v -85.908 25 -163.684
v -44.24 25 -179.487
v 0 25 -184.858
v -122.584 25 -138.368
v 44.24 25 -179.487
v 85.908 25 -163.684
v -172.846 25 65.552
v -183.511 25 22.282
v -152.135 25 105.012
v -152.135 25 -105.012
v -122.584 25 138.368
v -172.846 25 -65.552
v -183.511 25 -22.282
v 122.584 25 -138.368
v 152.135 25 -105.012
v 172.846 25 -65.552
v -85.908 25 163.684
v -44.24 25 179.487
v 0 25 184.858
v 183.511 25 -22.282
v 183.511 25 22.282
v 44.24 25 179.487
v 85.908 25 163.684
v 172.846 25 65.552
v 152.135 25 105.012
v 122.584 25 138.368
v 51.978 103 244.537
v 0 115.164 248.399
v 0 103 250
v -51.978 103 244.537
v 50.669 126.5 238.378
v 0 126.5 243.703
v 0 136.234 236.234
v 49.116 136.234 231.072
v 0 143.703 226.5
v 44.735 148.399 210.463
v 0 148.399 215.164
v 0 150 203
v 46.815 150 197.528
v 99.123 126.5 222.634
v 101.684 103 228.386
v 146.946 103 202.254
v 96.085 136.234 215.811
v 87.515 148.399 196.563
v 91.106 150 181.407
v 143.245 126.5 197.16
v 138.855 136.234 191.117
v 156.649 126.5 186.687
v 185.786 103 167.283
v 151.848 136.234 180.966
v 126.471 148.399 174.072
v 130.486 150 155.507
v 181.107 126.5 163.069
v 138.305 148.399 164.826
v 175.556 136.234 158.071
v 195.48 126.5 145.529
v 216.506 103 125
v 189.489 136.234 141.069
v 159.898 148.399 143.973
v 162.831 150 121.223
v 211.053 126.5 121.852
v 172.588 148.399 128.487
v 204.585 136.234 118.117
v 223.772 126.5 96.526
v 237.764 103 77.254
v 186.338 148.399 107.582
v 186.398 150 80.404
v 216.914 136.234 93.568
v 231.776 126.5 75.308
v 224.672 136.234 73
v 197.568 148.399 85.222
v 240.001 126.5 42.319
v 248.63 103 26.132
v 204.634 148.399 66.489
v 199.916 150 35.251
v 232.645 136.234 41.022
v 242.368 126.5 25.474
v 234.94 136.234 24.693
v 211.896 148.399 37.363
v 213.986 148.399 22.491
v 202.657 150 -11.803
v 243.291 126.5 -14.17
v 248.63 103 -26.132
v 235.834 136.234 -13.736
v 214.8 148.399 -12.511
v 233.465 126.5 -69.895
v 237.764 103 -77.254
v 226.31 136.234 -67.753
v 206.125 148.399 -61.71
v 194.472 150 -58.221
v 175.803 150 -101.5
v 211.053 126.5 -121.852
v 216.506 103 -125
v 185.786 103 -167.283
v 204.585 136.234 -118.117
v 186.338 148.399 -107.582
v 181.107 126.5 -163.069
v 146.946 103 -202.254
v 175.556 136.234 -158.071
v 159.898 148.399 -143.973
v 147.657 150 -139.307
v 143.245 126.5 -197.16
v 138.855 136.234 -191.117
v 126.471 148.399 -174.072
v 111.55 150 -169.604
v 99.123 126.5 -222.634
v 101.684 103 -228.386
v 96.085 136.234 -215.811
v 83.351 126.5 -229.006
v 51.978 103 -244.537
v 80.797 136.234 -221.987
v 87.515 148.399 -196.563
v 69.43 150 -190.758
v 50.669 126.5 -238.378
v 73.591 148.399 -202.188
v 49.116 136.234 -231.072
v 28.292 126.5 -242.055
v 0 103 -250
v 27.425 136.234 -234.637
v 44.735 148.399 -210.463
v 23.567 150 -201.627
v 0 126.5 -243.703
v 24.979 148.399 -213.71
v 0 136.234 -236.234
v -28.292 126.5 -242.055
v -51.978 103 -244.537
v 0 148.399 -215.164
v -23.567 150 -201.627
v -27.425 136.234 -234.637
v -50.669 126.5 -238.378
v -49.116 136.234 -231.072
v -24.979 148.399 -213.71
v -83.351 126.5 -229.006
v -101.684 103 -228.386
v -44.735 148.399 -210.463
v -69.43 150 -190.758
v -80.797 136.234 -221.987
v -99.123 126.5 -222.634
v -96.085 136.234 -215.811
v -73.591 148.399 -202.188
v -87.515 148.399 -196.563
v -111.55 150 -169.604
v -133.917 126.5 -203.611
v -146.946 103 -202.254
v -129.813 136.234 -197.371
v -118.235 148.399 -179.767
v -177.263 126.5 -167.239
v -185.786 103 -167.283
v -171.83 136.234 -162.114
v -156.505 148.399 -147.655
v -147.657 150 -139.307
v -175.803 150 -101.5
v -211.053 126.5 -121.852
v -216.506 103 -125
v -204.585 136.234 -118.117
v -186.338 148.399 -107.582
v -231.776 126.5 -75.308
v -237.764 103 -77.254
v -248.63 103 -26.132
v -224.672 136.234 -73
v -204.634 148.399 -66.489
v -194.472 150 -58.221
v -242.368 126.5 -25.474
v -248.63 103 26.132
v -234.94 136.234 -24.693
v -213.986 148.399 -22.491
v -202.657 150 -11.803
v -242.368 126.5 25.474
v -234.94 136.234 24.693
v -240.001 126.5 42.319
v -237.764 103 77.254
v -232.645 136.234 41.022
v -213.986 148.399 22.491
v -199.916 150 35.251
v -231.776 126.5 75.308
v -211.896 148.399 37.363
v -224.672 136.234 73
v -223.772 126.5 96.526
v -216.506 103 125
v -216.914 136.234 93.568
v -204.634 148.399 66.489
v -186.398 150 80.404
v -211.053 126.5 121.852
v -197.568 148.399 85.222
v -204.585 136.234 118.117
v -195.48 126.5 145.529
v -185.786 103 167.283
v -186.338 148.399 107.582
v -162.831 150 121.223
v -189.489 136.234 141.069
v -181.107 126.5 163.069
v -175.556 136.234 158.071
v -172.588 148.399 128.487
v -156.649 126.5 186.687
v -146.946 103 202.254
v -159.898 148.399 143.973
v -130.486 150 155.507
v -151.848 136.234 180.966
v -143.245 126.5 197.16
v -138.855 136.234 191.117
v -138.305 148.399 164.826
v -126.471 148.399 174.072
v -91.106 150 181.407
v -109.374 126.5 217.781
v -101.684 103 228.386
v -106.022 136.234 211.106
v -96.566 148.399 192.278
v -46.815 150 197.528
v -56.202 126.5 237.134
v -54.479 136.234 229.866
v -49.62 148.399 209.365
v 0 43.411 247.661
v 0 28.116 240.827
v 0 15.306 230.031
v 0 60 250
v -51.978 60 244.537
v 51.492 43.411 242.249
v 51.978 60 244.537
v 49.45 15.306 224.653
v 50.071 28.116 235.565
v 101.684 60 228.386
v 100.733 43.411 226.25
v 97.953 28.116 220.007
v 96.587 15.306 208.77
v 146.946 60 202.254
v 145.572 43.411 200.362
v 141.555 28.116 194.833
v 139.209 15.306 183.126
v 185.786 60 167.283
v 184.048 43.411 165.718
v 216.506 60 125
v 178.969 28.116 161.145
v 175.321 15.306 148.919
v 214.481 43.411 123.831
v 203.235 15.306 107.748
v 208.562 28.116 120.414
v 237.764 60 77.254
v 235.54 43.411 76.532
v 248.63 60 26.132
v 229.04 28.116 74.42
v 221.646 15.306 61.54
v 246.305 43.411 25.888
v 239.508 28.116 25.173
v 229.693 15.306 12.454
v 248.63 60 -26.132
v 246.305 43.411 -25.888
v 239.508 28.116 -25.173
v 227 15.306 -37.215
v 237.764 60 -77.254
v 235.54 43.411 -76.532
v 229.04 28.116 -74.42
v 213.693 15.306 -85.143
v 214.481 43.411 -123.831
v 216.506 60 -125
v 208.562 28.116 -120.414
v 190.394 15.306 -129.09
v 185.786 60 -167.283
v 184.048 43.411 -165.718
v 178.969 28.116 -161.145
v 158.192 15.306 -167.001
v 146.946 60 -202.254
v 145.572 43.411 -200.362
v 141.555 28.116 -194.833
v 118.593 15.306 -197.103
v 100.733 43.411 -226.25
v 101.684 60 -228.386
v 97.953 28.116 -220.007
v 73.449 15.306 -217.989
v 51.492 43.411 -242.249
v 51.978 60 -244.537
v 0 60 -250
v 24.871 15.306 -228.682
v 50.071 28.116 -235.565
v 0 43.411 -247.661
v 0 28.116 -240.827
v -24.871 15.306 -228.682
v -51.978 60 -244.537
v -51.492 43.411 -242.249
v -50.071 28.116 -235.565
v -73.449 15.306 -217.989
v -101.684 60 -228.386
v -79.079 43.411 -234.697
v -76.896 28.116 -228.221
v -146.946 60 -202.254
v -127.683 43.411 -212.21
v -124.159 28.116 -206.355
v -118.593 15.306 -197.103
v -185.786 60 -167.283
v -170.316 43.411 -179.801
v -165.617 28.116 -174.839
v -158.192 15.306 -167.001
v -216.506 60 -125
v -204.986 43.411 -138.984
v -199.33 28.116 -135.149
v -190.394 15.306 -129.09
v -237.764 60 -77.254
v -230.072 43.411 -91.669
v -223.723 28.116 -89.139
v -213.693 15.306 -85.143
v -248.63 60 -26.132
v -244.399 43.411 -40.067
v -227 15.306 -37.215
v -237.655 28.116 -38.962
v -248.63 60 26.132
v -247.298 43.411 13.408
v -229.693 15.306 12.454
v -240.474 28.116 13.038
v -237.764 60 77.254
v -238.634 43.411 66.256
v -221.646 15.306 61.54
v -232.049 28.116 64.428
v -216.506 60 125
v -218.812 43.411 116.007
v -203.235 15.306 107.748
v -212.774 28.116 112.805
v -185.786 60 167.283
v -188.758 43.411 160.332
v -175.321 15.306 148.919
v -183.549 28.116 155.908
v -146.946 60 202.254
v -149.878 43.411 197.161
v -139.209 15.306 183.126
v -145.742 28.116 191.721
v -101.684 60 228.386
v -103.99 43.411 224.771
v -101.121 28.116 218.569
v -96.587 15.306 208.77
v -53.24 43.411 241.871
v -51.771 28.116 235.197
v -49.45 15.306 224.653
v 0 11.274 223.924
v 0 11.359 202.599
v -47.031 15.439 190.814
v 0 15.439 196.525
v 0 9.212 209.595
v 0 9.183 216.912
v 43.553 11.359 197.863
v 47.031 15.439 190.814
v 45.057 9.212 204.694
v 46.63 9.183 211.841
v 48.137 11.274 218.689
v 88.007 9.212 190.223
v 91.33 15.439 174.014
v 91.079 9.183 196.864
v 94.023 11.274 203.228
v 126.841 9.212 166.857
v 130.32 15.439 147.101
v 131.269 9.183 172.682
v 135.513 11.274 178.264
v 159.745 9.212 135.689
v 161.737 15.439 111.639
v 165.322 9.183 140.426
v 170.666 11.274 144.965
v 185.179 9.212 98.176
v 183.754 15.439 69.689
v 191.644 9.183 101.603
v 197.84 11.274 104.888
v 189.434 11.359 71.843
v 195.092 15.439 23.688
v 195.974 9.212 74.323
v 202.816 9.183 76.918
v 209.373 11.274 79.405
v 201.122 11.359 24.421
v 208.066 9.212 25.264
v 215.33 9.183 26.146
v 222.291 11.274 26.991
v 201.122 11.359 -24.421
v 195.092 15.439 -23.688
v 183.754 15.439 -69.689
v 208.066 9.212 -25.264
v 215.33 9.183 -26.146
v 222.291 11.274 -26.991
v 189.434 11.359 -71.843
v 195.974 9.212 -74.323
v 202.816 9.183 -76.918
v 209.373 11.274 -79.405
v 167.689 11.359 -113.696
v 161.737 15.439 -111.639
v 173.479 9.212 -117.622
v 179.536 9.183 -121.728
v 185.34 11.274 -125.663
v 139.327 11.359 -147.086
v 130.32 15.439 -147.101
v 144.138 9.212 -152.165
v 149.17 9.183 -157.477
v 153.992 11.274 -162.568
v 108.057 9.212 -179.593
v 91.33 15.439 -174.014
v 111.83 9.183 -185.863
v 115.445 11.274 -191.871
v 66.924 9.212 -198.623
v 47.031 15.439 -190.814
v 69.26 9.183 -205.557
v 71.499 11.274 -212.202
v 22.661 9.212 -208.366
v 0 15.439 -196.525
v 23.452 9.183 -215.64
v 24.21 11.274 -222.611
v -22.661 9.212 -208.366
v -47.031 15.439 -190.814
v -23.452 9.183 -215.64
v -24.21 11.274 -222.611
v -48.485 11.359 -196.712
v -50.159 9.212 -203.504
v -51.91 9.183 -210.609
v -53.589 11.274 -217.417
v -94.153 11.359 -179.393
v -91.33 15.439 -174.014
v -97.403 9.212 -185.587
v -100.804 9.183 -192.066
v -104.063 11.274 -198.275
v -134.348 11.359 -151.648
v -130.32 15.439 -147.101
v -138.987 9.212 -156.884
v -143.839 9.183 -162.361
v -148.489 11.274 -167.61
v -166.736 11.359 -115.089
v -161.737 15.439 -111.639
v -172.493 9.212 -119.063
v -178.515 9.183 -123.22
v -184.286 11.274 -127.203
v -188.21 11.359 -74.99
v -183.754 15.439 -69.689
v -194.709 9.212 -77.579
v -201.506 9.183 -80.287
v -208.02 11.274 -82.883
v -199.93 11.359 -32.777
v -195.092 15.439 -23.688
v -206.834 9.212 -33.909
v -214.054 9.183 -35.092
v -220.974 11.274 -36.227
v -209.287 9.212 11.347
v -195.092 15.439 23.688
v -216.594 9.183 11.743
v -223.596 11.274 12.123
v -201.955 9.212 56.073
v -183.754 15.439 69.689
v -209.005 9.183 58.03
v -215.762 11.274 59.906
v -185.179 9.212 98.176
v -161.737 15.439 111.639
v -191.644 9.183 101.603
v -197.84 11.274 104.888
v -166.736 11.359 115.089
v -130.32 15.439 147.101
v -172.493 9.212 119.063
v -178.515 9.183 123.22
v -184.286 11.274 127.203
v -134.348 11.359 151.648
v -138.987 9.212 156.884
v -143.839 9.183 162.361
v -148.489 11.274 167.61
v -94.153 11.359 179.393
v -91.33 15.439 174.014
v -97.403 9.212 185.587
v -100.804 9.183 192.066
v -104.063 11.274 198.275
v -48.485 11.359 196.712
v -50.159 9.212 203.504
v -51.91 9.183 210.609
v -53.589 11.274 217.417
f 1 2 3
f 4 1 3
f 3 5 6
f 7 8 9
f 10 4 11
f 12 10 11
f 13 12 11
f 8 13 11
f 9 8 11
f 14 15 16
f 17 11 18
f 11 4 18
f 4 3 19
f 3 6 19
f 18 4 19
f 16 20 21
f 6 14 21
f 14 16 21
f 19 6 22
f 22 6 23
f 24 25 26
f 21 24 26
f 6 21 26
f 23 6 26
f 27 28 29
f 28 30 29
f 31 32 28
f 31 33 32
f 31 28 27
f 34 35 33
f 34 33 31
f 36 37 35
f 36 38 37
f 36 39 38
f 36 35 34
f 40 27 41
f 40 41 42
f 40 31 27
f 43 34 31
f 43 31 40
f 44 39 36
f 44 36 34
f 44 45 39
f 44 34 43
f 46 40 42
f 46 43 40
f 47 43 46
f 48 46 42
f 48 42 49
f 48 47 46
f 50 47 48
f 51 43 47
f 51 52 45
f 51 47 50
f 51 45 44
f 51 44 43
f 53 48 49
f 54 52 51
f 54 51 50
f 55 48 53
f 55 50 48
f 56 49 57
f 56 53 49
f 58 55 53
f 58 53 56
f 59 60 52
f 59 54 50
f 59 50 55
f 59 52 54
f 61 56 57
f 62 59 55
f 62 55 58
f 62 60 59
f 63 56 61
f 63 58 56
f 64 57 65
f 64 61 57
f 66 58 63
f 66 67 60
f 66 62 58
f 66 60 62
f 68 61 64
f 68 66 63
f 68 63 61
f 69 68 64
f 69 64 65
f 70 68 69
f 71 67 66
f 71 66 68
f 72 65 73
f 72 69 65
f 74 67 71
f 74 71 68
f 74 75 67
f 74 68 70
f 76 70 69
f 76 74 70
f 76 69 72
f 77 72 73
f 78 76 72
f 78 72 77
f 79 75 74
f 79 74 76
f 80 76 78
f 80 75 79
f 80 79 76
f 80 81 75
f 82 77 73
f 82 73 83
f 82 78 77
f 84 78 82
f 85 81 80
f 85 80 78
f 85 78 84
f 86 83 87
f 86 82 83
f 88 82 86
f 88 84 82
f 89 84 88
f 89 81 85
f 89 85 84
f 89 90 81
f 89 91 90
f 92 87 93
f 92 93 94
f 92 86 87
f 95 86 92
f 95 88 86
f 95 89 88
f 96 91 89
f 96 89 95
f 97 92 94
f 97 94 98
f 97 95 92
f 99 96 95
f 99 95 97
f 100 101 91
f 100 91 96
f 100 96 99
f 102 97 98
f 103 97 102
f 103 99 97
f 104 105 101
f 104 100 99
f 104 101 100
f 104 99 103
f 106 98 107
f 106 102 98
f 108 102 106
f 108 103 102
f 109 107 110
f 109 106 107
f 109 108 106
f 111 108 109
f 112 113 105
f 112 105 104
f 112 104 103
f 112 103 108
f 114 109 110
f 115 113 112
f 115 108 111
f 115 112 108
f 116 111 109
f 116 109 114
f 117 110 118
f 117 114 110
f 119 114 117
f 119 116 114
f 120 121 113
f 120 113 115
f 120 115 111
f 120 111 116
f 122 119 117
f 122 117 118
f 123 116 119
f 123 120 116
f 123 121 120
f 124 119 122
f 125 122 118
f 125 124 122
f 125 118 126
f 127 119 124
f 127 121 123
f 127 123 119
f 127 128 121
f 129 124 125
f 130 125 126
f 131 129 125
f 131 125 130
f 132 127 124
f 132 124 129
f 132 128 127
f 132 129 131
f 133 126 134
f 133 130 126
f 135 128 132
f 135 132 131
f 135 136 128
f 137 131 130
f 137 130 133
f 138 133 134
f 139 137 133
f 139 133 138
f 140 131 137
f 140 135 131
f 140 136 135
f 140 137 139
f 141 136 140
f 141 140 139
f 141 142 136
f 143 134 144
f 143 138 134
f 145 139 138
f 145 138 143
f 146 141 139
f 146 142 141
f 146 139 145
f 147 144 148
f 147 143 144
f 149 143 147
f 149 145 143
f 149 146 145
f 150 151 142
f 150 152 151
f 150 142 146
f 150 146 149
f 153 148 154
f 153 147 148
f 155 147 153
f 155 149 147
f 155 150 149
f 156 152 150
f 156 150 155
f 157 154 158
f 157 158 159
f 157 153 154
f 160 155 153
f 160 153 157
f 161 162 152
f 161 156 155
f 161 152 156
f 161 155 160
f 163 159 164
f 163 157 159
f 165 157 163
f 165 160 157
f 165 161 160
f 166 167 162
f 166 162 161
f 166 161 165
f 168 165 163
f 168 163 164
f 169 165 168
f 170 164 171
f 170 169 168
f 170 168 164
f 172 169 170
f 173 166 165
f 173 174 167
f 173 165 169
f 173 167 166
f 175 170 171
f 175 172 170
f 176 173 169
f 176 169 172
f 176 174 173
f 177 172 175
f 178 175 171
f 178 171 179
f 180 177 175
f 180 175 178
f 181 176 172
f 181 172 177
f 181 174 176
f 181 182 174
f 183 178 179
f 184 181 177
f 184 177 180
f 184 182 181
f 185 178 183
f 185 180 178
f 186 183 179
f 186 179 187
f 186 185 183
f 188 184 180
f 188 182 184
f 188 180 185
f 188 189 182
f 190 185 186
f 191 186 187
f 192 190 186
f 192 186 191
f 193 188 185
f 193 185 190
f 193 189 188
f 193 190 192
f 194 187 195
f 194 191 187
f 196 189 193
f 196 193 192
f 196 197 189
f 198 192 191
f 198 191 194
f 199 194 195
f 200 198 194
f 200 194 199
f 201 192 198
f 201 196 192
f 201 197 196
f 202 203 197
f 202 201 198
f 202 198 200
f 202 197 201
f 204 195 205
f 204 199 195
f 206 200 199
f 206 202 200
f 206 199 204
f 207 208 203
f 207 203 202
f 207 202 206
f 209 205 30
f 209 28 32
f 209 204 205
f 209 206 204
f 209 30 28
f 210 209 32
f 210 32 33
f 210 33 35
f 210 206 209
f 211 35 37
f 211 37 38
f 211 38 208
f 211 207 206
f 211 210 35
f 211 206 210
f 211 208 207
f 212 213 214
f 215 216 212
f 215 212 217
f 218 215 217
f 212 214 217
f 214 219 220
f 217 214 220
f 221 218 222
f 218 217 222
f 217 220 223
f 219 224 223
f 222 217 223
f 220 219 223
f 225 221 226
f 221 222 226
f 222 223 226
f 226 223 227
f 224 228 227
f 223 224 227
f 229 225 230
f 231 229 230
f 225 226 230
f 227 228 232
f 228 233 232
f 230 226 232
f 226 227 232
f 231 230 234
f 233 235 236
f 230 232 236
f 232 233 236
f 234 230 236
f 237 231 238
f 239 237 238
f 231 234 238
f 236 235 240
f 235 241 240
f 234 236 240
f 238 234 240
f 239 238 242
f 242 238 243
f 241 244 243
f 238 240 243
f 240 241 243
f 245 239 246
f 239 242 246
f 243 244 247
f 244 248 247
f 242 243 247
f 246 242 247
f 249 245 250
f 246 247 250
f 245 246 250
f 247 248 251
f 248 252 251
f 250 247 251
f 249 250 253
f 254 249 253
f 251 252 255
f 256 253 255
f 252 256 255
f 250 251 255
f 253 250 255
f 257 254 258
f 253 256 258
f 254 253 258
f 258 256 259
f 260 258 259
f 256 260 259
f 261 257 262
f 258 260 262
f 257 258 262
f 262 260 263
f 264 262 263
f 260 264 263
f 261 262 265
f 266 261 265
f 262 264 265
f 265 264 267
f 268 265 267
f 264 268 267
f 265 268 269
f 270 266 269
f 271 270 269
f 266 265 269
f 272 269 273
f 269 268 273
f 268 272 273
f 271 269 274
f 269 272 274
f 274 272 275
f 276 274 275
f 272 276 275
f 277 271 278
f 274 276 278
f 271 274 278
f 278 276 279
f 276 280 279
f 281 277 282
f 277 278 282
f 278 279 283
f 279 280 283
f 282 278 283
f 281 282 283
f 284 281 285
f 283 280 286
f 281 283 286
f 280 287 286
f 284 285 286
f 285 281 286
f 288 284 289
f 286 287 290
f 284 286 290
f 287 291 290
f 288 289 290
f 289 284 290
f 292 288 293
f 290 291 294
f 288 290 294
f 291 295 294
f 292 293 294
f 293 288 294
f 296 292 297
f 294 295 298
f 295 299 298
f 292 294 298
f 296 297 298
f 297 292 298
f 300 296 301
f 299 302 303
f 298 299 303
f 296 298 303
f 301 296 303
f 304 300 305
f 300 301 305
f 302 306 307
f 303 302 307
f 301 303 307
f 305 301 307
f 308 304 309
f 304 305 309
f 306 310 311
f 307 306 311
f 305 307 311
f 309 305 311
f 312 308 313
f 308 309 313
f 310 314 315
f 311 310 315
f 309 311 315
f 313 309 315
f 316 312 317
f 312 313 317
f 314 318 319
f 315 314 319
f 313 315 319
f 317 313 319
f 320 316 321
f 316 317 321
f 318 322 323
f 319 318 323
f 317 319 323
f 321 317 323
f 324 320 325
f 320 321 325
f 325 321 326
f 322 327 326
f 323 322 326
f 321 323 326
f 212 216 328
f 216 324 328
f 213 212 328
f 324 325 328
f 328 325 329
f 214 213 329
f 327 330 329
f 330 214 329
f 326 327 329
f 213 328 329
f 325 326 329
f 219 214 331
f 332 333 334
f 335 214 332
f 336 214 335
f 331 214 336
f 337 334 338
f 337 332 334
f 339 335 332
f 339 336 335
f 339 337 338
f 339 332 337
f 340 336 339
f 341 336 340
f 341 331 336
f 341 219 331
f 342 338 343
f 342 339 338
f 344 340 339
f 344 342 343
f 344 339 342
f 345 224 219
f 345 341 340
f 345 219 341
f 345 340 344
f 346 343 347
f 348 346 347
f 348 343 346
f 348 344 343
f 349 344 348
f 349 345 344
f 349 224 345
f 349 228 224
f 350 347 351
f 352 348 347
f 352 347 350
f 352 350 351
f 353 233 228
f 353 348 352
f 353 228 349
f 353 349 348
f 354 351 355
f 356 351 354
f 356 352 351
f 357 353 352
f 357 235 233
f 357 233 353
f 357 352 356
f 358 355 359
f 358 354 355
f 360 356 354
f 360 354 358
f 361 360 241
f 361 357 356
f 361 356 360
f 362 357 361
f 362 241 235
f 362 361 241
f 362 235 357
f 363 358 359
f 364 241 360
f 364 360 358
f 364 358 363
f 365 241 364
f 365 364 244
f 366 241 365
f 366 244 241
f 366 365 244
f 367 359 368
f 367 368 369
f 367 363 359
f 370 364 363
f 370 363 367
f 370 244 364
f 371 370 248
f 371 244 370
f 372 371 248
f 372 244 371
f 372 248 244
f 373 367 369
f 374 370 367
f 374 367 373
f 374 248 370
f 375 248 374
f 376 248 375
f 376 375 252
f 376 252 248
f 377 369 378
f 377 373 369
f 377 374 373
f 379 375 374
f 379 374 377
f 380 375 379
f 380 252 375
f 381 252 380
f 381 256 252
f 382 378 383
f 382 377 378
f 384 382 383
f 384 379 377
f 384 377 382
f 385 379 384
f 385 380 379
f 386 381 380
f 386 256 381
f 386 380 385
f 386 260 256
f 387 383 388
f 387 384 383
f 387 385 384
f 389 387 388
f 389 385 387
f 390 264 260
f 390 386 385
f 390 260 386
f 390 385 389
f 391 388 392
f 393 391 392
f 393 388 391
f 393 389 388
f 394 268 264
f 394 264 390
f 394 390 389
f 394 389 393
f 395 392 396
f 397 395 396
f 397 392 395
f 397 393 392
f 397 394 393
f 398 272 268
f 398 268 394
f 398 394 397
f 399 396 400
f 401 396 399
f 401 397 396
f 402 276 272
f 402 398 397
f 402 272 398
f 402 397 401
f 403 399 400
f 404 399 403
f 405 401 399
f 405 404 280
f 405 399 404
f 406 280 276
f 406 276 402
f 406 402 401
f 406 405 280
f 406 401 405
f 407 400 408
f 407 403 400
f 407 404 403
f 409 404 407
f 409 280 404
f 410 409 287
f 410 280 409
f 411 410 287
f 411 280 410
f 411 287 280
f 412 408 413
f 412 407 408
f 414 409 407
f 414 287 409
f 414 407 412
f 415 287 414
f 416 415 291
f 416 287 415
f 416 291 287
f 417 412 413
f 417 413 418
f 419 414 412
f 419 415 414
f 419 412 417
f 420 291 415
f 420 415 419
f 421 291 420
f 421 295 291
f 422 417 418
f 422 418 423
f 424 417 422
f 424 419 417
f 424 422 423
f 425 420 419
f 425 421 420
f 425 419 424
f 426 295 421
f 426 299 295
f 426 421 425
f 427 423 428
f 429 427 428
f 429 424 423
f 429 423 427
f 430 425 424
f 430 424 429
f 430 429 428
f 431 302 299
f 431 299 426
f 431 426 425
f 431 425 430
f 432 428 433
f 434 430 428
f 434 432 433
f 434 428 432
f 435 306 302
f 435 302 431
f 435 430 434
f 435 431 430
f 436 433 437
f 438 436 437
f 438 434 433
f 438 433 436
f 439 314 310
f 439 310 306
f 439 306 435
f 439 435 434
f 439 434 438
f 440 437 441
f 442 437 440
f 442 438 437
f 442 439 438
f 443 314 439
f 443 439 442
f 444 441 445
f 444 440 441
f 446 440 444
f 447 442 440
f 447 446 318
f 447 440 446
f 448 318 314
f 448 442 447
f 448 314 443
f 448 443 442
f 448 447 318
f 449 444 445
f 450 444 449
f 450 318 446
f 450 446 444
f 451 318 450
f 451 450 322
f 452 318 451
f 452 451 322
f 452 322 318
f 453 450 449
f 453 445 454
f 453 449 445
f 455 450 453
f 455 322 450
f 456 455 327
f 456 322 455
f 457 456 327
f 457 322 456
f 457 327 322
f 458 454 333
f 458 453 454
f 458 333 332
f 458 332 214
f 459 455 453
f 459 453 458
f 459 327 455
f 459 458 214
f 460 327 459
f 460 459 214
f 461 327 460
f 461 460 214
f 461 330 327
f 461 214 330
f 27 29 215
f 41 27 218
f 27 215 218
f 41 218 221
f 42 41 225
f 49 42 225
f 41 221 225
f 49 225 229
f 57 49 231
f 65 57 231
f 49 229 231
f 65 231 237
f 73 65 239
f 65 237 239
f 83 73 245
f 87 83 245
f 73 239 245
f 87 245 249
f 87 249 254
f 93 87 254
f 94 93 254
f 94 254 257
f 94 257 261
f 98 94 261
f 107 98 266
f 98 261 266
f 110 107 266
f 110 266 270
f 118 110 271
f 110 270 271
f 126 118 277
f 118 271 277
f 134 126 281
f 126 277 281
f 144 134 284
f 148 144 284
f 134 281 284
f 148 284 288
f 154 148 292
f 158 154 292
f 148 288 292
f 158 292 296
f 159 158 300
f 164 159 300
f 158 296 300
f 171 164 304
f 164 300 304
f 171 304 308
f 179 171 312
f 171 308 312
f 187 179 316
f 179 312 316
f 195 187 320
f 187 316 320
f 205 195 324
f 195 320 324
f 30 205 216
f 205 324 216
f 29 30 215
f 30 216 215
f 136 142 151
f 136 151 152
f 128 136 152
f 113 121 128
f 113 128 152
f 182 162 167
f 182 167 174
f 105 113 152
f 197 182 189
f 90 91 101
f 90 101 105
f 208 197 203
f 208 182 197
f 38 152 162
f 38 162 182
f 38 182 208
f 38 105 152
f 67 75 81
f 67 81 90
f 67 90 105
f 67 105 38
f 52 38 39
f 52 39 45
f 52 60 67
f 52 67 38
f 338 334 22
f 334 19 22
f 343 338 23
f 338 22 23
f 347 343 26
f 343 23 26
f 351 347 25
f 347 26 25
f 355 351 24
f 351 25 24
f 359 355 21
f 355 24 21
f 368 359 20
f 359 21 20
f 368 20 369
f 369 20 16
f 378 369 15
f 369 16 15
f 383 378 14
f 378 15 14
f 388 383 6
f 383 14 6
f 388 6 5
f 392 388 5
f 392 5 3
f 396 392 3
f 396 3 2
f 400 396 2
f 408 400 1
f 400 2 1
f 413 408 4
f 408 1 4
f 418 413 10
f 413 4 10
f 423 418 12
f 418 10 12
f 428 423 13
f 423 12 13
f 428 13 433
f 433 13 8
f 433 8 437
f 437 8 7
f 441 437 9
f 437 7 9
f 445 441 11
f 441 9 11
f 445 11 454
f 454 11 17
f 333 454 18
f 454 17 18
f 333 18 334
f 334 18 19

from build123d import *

# Parameters (mm, degrees)
SKETCH_4_R          = 250
EXTRUDE_2_DEPTH     = 150
FILLET_1_R          = 60
FILLET_2_R          = 47
SKETCH_16_R         = 190
CUT_EXTRUDE_1_DEPTH = 25
FILLET_3_R          = 25


with BuildPart() as part:
    # 草图4 → 凸台-拉伸2 (new body)
    with BuildSketch(Plane(origin=(0, 0, 0), x_dir=(1, 0, 0), z_dir=(0, 1, 0))):
        with Locations(Location((0, 0, 0), (0, 0, 270))):
            Circle(SKETCH_4_R)
    extrude(amount=EXTRUDE_2_DEPTH)

    # 圆角1
    fillet_1_edges = [part.edges().sort_by_distance(p)[0] for p in [
        (0, 0, -250),
    ]]
    fillet(fillet_1_edges, radius=FILLET_1_R)

    # 圆角2
    fillet_2_edges = [part.edges().sort_by_distance(p)[0] for p in [
        (0, 150, -250),
    ]]
    fillet(fillet_2_edges, radius=FILLET_2_R)

    # 草图16 → 切除-拉伸1 (cut)
    with BuildSketch(Plane(origin=(0, 0, 0), x_dir=(1, 0, 0), z_dir=(0, 1, 0))):
        with Locations(Location((0, 0, 0), (0, 0, 270))):
            Circle(SKETCH_16_R)
    extrude(amount=CUT_EXTRUDE_1_DEPTH, mode=Mode.SUBTRACT)

    # 圆角3
    # the kernel refuses this fillet: 25 mm, written as the material it takes off along each edge
    with BuildSketch(Plane(origin=(0, 0, 0), x_dir=(0, 0, 1), z_dir=(-1, 0, 0))) as fillet_3_piece_1:
        with BuildLine():
            CenterArc((213.35124434, 33.928571429), FILLET_3_R, 200.924832428, 110.924832428)
            Line((190, 25), (189.532975113, 24.821428571))
            ThreePointArc((189.532975113, 24.821428571), (189.5, 12.5), (189.5, 0))
            Line((189.5, 0), (190, -0.5))
            ThreePointArc((190, -0.5), (211.607142857, 3.489988696), (230.364293788, 14.933673469))
            Line((230.364293788, 14.933673469), (230.030704584, 15.306122449))
        make_face()
    revolve(axis=Axis((0, 0, 0), (0, 1, 0)), mode=Mode.SUBTRACT)

    # 倒角1
    # the kernel refuses this chamfer: 17.333818879, 10 mm, written as the material it adds along each edge
    with BuildSketch(Plane(origin=(0, 25, 0), x_dir=(0, 0, 1), z_dir=(-1, 0, 0))) as chamfer_1_piece_1:
        with BuildLine():
            Line((197.061199814, -10.000793021), (184.322097601, 0.439495442))
            Line((184.322097601, 0.439495442), (184.322097601, 0.786171819))
            ThreePointArc((184.322097601, 0.786171819), (187.161048801, 0.346676378), (190, 0.346676378))
            Line((190, 0.346676378), (190.323812992, 0.123812992))
            ThreePointArc((190.323812992, 0.123812992), (193.180553266, -5.246391965), (197.294531196, -9.744392989))
            Line((197.294531196, -9.744392989), (197.061199814, -10.000793021))
        make_face()
    revolve(axis=Axis((0, 25, 0), (0, 1, 0)))


solid = part.part
